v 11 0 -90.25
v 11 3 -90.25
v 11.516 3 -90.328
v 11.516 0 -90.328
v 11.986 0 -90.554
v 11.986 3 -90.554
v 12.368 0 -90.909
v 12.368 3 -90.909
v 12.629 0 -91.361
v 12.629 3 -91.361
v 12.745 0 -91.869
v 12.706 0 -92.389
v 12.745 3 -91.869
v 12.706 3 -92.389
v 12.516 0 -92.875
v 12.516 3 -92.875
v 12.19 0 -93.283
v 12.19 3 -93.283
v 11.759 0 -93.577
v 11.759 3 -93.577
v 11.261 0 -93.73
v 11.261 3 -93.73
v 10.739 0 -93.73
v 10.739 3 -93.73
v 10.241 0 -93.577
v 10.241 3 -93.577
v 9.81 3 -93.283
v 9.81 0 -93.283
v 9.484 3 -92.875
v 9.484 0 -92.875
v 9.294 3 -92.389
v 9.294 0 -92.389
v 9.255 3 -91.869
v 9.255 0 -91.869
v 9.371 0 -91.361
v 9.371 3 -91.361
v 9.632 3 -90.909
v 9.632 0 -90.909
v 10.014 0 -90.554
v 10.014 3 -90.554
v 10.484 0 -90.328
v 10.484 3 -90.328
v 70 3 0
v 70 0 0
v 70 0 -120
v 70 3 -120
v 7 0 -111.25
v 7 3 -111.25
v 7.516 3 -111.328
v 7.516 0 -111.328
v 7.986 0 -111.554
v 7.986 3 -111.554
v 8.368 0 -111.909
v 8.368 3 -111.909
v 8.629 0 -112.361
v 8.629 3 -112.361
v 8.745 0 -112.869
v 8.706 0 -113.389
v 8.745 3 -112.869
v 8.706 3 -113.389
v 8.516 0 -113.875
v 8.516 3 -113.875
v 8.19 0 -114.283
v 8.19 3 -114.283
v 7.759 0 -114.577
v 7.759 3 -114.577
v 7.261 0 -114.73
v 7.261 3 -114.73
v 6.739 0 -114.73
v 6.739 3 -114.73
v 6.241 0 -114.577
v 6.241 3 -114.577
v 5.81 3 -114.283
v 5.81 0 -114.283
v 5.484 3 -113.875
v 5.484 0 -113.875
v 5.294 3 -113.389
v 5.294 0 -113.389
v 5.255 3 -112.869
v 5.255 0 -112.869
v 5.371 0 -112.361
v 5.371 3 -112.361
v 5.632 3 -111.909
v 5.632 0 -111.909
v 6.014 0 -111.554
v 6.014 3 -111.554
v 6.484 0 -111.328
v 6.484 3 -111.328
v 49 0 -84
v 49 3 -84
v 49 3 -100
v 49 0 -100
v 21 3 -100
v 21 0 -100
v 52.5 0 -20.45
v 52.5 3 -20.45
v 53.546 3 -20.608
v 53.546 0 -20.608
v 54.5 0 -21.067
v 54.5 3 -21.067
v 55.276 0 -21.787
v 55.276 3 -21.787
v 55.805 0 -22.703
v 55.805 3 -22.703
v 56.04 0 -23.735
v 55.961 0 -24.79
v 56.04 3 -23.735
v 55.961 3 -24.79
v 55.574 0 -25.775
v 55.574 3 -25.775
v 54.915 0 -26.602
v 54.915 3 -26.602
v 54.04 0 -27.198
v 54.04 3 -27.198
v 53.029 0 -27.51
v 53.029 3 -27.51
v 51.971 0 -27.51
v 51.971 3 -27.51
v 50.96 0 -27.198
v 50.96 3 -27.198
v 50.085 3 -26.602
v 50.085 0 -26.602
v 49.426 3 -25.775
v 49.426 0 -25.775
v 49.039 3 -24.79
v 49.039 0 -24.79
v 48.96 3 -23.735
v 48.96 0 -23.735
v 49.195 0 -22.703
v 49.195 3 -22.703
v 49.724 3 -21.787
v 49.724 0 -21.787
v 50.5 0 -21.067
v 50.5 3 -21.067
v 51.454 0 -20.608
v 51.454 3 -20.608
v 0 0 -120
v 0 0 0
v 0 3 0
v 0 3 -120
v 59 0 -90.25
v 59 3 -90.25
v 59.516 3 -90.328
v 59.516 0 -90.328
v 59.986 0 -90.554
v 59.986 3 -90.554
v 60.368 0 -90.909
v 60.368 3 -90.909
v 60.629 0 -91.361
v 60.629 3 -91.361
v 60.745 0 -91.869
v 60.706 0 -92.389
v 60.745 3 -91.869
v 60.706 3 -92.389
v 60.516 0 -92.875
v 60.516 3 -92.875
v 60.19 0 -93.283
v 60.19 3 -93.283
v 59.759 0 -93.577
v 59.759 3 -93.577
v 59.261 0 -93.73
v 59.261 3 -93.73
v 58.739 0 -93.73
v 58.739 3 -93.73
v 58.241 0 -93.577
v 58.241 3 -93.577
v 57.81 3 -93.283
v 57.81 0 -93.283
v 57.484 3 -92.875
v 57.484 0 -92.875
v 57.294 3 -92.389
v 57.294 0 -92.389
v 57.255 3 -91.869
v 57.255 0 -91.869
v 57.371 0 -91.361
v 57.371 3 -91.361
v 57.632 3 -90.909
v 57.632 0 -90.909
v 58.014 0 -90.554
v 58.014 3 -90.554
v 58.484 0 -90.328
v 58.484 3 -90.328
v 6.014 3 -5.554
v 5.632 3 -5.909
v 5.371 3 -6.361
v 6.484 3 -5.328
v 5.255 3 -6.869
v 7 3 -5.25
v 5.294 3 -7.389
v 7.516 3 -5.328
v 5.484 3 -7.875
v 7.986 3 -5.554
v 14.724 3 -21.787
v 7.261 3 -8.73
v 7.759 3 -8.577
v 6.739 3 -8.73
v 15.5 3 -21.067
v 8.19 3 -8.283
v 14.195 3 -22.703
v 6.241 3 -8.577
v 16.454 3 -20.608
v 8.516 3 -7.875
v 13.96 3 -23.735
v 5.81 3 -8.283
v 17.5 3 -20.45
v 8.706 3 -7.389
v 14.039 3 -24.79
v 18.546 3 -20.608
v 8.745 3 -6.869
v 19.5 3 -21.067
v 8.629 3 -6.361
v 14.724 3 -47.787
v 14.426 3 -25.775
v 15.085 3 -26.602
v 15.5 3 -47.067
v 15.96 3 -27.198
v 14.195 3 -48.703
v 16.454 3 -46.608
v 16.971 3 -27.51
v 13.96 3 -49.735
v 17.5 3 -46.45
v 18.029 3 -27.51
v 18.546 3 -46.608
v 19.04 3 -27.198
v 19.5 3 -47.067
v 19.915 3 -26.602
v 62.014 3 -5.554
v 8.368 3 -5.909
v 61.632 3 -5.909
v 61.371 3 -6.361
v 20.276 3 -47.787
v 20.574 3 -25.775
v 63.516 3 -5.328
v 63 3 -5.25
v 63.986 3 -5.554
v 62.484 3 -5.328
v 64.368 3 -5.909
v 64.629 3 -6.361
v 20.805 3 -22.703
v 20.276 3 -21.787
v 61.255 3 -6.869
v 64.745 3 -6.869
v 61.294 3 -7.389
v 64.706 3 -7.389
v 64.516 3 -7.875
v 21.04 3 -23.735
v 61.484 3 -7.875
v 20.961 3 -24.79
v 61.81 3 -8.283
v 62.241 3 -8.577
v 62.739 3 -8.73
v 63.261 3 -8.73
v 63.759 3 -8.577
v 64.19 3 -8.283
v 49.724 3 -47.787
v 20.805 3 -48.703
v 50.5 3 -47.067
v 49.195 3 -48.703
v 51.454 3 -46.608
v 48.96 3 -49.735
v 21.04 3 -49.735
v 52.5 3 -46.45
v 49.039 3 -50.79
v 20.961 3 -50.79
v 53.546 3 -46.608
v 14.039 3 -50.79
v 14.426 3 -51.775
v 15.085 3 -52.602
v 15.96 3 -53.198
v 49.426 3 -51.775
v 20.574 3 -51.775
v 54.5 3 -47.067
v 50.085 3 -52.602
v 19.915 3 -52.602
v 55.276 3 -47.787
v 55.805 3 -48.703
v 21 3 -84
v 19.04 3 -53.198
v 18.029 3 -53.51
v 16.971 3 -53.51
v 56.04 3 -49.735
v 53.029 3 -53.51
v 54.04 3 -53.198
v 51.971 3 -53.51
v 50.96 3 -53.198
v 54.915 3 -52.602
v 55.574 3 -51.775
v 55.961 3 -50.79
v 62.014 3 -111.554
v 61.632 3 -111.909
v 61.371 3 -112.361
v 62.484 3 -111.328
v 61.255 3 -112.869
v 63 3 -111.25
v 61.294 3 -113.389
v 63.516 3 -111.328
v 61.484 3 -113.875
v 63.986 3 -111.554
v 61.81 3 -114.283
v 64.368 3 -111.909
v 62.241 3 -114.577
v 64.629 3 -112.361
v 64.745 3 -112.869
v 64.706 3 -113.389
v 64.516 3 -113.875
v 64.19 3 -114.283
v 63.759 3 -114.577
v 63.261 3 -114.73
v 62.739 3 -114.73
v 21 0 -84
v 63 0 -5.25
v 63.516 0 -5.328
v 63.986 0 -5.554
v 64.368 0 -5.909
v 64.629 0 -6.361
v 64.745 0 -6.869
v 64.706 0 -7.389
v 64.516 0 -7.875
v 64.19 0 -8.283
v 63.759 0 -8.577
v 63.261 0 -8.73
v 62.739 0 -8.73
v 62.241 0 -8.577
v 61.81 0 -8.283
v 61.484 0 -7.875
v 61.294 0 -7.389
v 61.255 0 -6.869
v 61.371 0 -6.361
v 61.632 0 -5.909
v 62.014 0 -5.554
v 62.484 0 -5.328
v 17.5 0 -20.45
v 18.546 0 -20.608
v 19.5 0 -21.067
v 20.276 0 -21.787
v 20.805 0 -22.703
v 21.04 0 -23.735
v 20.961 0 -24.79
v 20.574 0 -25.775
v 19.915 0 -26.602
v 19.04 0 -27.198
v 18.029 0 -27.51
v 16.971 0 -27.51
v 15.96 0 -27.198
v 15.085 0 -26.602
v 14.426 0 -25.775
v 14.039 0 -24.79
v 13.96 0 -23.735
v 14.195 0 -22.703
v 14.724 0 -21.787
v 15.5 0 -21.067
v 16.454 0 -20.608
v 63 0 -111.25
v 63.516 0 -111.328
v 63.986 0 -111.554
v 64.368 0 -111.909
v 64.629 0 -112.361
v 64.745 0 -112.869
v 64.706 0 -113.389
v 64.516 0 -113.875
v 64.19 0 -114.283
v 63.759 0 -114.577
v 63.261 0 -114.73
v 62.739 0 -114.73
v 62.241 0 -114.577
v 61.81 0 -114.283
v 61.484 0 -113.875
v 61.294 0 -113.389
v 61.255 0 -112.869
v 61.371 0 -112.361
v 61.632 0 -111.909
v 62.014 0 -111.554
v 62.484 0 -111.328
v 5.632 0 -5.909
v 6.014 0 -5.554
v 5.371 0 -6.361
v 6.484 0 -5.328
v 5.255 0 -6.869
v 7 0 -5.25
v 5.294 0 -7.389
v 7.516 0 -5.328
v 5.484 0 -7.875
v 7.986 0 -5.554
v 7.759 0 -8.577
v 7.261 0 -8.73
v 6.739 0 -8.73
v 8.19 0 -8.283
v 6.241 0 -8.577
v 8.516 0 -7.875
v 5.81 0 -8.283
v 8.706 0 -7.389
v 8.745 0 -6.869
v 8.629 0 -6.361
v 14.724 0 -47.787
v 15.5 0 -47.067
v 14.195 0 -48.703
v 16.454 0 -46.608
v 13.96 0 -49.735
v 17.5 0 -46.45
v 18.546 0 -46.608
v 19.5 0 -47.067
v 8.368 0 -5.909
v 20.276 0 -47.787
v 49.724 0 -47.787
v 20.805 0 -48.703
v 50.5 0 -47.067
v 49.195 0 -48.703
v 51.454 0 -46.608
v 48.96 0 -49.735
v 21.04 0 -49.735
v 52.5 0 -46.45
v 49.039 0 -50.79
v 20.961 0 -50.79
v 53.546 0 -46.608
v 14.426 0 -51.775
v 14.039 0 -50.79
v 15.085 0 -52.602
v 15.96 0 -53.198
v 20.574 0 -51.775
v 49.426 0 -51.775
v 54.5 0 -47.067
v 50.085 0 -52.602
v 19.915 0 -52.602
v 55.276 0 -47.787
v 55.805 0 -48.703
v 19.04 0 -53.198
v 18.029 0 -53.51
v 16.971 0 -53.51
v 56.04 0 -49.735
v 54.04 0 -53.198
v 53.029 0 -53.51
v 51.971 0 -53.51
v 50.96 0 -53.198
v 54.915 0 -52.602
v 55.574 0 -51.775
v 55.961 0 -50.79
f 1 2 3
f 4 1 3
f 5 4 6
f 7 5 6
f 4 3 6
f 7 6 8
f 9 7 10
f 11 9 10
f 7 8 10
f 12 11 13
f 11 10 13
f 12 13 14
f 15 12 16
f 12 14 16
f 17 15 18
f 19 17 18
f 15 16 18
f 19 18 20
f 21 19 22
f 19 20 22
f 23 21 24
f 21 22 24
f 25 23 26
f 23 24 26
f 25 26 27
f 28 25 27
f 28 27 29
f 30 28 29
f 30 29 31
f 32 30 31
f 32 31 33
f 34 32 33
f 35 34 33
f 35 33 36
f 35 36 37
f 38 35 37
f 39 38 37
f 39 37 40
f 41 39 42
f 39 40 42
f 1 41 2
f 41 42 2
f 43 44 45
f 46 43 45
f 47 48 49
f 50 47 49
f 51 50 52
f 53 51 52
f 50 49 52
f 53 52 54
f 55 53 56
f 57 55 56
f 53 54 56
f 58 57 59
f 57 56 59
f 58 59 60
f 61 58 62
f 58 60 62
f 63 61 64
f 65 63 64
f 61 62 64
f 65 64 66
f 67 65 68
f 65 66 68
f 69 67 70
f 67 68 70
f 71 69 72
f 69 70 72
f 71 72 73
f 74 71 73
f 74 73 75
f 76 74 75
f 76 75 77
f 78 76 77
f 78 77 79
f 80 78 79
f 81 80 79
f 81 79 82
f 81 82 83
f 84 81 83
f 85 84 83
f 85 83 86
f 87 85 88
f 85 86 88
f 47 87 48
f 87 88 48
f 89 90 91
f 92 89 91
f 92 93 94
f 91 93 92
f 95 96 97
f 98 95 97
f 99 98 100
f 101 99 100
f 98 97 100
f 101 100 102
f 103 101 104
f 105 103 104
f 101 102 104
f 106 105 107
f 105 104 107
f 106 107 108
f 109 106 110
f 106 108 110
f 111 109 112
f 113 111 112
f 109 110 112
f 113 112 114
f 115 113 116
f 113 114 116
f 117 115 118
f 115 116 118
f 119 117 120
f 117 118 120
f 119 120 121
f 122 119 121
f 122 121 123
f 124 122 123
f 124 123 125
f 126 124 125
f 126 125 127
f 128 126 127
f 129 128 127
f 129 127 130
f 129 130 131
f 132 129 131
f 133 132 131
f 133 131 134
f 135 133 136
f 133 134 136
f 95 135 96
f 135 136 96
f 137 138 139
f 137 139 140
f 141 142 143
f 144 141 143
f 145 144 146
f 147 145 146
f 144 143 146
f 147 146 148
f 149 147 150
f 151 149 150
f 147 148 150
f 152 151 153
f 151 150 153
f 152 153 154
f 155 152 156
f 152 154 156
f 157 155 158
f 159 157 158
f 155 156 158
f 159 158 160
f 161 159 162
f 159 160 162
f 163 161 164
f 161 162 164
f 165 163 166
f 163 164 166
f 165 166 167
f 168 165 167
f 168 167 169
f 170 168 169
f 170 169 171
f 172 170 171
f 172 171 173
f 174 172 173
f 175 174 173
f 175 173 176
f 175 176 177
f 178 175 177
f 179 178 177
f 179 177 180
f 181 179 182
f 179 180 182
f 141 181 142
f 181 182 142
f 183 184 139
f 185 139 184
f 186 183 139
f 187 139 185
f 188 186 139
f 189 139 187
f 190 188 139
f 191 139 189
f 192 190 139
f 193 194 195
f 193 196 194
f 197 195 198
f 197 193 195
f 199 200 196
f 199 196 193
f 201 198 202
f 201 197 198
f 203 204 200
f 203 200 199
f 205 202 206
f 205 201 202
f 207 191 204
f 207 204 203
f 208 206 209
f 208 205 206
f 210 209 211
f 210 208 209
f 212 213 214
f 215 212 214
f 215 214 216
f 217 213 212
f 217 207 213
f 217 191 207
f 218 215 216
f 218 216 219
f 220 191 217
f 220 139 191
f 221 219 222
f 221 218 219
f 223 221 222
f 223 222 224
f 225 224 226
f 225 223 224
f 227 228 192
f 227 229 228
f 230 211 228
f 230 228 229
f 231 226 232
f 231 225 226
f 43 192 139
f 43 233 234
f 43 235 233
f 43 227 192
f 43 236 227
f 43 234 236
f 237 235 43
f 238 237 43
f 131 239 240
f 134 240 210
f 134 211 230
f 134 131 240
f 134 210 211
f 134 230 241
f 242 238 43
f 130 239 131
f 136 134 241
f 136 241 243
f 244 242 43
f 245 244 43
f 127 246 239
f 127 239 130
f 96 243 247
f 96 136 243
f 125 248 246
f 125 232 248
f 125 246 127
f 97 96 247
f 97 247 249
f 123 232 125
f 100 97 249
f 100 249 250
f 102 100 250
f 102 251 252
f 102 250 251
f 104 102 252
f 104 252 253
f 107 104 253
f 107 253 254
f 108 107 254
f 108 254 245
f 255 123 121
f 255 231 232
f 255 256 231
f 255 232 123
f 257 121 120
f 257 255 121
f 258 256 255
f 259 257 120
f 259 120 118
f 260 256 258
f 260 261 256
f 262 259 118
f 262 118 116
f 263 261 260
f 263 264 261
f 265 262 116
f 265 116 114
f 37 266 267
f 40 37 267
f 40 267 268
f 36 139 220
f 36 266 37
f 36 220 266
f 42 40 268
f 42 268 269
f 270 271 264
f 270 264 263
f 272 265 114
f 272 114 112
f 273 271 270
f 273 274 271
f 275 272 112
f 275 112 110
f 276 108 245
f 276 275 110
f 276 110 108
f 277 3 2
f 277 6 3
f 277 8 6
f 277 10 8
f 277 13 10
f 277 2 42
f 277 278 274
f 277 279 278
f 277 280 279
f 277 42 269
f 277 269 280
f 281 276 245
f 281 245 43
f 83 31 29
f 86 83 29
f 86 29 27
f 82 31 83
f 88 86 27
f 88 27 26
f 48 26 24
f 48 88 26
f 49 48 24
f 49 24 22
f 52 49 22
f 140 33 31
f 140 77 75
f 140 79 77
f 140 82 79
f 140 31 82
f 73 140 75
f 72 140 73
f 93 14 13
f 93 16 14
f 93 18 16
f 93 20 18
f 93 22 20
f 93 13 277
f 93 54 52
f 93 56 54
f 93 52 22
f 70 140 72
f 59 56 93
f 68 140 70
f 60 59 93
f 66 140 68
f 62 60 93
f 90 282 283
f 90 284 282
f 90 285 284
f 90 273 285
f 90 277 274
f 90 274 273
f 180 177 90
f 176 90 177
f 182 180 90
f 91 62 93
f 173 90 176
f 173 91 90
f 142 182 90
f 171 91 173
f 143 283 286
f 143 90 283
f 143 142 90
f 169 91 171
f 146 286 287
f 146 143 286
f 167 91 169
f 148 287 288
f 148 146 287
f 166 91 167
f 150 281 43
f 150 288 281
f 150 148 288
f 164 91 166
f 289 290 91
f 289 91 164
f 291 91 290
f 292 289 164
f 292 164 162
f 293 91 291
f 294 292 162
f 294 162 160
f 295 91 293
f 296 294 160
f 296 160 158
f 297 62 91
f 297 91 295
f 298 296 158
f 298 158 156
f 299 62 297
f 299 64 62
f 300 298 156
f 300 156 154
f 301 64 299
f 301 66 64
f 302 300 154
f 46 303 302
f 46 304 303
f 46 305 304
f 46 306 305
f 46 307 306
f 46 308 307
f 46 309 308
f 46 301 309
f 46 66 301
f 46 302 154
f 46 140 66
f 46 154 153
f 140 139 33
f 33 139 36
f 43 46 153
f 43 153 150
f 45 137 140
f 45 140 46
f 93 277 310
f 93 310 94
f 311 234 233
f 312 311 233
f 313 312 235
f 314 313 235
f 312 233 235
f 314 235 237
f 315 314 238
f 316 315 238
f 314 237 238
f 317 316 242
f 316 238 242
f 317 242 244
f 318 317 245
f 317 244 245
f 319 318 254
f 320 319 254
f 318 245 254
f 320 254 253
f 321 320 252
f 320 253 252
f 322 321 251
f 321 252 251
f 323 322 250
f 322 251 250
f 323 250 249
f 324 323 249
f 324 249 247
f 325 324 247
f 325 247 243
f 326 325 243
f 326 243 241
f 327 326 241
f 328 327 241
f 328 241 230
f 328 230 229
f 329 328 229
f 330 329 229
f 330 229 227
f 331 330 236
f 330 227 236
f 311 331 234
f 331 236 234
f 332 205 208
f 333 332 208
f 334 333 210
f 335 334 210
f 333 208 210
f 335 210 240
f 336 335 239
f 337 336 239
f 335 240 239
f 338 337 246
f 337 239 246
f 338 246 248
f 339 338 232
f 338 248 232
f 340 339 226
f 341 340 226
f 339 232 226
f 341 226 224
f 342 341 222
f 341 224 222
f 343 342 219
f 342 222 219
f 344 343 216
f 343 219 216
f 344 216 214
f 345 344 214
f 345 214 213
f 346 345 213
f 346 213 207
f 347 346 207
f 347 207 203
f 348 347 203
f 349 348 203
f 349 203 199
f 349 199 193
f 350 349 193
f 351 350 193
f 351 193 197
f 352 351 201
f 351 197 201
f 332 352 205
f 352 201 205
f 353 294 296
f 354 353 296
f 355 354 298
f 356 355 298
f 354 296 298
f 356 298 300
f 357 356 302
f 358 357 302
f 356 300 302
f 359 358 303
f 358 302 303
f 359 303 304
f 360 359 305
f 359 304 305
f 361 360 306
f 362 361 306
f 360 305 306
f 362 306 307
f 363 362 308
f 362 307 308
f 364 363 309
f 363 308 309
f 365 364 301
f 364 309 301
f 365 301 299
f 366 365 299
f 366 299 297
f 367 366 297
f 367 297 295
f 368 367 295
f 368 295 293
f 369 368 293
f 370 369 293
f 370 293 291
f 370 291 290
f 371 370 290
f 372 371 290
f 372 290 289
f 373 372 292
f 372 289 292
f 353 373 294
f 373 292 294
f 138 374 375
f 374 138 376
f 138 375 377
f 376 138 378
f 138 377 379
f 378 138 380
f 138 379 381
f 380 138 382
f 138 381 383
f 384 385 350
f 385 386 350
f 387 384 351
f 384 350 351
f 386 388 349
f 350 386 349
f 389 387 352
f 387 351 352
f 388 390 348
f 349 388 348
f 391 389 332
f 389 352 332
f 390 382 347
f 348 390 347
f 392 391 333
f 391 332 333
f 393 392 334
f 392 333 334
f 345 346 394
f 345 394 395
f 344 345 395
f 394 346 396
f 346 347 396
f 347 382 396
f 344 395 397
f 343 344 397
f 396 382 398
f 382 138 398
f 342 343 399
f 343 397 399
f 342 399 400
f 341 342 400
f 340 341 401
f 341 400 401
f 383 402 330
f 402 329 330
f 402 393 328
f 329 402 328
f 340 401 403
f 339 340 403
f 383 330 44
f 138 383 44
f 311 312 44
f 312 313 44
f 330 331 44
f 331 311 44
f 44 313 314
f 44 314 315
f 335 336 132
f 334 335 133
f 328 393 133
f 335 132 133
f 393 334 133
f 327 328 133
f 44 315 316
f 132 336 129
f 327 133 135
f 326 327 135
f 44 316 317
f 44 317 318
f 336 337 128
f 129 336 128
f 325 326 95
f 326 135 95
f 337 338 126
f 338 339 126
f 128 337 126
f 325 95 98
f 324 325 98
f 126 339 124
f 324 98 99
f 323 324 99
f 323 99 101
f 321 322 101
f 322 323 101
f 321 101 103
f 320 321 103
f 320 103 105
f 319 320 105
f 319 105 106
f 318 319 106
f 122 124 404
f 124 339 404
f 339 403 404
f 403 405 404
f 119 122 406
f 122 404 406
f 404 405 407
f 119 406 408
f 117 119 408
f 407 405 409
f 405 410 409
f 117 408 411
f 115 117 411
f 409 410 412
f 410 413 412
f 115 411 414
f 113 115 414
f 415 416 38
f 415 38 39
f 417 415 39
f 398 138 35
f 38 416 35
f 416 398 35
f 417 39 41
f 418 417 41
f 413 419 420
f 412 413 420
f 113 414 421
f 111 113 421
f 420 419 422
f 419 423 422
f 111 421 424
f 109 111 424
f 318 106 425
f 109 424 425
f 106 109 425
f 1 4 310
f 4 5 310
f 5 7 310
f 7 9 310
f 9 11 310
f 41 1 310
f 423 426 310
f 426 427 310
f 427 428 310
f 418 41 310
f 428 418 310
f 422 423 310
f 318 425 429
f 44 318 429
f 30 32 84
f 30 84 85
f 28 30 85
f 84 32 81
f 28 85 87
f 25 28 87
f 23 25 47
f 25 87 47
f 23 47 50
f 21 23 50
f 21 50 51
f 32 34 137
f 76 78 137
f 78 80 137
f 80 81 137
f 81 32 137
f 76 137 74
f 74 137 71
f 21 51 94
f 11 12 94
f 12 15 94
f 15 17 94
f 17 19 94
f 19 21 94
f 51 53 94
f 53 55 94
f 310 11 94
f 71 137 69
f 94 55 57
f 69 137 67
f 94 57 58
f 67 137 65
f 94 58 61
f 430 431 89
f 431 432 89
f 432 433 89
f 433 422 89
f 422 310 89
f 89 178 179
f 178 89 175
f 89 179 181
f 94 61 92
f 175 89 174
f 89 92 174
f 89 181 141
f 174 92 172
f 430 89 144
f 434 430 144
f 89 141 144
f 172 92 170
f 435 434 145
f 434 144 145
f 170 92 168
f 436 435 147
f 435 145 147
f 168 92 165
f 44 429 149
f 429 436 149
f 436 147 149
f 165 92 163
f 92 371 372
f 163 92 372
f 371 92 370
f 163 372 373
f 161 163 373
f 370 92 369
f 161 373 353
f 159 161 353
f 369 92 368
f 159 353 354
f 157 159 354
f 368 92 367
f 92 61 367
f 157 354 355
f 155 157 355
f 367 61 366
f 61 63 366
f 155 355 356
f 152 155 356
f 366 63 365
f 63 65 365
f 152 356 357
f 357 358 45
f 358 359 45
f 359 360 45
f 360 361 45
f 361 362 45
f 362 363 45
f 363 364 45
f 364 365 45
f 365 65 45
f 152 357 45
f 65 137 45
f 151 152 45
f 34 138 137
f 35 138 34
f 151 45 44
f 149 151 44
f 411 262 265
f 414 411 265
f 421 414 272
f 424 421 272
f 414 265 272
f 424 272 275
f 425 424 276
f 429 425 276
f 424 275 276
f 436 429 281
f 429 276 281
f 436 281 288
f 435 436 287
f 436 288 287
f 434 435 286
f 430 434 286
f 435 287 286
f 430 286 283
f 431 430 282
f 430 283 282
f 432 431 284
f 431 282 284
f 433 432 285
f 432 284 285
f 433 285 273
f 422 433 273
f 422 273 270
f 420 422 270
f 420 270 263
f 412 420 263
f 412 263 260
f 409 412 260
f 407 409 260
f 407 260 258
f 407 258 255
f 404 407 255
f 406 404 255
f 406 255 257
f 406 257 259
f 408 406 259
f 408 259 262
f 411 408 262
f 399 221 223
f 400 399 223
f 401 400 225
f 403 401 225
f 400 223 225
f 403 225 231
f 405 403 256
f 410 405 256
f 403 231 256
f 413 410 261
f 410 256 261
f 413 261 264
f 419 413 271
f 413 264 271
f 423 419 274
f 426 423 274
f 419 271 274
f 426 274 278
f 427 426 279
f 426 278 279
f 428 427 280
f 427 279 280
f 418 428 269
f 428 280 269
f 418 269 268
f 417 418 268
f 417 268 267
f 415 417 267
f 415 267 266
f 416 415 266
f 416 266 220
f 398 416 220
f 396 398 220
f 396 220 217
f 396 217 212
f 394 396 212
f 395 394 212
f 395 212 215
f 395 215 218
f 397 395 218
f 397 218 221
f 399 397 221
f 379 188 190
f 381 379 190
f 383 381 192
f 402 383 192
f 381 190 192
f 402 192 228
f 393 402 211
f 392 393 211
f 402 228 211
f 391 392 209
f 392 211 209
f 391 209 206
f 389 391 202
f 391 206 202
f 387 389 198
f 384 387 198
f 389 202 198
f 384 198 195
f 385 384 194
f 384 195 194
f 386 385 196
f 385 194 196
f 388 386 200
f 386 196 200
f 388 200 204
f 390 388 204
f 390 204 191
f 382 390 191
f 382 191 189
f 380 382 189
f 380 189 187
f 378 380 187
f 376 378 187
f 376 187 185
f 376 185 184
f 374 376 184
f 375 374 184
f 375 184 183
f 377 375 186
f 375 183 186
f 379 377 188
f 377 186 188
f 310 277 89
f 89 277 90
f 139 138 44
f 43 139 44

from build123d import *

# Parameters (mm, degrees)
SKETCH1_W           = 70
SKETCH1_H           = 120
BOSS_EXTRUDE1_DEPTH = 3
SKETCH2_R           = 1.75
SKETCH2_R_2         = 3.55
SKETCH2_W           = 28
SKETCH2_H           = 16
CUT_EXTRUDE1_DEPTH  = 3
SKETCH4_R           = 3.55
CUT_EXTRUDE2_DEPTH  = 12


with BuildPart() as part:
    # Sketch1 → Boss-Extrude1 (new body)
    with BuildSketch(Plane(origin=(0, 0, 0), x_dir=(1, 0, 0), z_dir=(0, 1, 0))):
        with Locations((35, 60)):
            Rectangle(SKETCH1_W, SKETCH1_H)
    extrude(amount=BOSS_EXTRUDE1_DEPTH)

    # Sketch2 → Cut-Extrude1 (cut)
    with BuildSketch(Plane(origin=(0, 3, 0), x_dir=(1, 0, 0), z_dir=(0, 1, 0))):
        with Locations(Location((11, 92, 0), (0, 0, 270))):
            Circle(SKETCH2_R)
        with Locations(Location((59, 92, 0), (0, 0, 270))):
            Circle(SKETCH2_R)
        with Locations(Location((52.5, 24, 0), (0, 0, 270))):
            Circle(SKETCH2_R_2)
        with Locations(Location((17.5, 24, 0), (0, 0, 270))):
            Circle(SKETCH2_R_2)
        with Locations(Location((7, 113, 0), (0, 0, 270))):
            Circle(SKETCH2_R)
        with Locations(Location((63, 113, 0), (0, 0, 270))):
            Circle(SKETCH2_R)
        with Locations(Location((63, 7, 0), (0, 0, 270))):
            Circle(SKETCH2_R)
        with Locations(Location((7, 7, 0), (0, 0, 270))):
            Circle(SKETCH2_R)
        with Locations((35, 92)):
            Rectangle(SKETCH2_W, SKETCH2_H)
    extrude(amount=-CUT_EXTRUDE1_DEPTH, mode=Mode.SUBTRACT)

    # Sketch4 → Cut-Extrude2 (cut)
    with BuildSketch(Plane(origin=(0, 3, 0), x_dir=(1, 0, 0), z_dir=(0, 1, 0))):
        with Locations(Location((17.5, 50, 0), (0, 0, 270))):
            Circle(SKETCH4_R)
        with Locations(Location((52.5, 50, 0), (0, 0, 270))):
            Circle(SKETCH4_R)
    extrude(amount=-CUT_EXTRUDE2_DEPTH, mode=Mode.SUBTRACT)


solid = part.part
